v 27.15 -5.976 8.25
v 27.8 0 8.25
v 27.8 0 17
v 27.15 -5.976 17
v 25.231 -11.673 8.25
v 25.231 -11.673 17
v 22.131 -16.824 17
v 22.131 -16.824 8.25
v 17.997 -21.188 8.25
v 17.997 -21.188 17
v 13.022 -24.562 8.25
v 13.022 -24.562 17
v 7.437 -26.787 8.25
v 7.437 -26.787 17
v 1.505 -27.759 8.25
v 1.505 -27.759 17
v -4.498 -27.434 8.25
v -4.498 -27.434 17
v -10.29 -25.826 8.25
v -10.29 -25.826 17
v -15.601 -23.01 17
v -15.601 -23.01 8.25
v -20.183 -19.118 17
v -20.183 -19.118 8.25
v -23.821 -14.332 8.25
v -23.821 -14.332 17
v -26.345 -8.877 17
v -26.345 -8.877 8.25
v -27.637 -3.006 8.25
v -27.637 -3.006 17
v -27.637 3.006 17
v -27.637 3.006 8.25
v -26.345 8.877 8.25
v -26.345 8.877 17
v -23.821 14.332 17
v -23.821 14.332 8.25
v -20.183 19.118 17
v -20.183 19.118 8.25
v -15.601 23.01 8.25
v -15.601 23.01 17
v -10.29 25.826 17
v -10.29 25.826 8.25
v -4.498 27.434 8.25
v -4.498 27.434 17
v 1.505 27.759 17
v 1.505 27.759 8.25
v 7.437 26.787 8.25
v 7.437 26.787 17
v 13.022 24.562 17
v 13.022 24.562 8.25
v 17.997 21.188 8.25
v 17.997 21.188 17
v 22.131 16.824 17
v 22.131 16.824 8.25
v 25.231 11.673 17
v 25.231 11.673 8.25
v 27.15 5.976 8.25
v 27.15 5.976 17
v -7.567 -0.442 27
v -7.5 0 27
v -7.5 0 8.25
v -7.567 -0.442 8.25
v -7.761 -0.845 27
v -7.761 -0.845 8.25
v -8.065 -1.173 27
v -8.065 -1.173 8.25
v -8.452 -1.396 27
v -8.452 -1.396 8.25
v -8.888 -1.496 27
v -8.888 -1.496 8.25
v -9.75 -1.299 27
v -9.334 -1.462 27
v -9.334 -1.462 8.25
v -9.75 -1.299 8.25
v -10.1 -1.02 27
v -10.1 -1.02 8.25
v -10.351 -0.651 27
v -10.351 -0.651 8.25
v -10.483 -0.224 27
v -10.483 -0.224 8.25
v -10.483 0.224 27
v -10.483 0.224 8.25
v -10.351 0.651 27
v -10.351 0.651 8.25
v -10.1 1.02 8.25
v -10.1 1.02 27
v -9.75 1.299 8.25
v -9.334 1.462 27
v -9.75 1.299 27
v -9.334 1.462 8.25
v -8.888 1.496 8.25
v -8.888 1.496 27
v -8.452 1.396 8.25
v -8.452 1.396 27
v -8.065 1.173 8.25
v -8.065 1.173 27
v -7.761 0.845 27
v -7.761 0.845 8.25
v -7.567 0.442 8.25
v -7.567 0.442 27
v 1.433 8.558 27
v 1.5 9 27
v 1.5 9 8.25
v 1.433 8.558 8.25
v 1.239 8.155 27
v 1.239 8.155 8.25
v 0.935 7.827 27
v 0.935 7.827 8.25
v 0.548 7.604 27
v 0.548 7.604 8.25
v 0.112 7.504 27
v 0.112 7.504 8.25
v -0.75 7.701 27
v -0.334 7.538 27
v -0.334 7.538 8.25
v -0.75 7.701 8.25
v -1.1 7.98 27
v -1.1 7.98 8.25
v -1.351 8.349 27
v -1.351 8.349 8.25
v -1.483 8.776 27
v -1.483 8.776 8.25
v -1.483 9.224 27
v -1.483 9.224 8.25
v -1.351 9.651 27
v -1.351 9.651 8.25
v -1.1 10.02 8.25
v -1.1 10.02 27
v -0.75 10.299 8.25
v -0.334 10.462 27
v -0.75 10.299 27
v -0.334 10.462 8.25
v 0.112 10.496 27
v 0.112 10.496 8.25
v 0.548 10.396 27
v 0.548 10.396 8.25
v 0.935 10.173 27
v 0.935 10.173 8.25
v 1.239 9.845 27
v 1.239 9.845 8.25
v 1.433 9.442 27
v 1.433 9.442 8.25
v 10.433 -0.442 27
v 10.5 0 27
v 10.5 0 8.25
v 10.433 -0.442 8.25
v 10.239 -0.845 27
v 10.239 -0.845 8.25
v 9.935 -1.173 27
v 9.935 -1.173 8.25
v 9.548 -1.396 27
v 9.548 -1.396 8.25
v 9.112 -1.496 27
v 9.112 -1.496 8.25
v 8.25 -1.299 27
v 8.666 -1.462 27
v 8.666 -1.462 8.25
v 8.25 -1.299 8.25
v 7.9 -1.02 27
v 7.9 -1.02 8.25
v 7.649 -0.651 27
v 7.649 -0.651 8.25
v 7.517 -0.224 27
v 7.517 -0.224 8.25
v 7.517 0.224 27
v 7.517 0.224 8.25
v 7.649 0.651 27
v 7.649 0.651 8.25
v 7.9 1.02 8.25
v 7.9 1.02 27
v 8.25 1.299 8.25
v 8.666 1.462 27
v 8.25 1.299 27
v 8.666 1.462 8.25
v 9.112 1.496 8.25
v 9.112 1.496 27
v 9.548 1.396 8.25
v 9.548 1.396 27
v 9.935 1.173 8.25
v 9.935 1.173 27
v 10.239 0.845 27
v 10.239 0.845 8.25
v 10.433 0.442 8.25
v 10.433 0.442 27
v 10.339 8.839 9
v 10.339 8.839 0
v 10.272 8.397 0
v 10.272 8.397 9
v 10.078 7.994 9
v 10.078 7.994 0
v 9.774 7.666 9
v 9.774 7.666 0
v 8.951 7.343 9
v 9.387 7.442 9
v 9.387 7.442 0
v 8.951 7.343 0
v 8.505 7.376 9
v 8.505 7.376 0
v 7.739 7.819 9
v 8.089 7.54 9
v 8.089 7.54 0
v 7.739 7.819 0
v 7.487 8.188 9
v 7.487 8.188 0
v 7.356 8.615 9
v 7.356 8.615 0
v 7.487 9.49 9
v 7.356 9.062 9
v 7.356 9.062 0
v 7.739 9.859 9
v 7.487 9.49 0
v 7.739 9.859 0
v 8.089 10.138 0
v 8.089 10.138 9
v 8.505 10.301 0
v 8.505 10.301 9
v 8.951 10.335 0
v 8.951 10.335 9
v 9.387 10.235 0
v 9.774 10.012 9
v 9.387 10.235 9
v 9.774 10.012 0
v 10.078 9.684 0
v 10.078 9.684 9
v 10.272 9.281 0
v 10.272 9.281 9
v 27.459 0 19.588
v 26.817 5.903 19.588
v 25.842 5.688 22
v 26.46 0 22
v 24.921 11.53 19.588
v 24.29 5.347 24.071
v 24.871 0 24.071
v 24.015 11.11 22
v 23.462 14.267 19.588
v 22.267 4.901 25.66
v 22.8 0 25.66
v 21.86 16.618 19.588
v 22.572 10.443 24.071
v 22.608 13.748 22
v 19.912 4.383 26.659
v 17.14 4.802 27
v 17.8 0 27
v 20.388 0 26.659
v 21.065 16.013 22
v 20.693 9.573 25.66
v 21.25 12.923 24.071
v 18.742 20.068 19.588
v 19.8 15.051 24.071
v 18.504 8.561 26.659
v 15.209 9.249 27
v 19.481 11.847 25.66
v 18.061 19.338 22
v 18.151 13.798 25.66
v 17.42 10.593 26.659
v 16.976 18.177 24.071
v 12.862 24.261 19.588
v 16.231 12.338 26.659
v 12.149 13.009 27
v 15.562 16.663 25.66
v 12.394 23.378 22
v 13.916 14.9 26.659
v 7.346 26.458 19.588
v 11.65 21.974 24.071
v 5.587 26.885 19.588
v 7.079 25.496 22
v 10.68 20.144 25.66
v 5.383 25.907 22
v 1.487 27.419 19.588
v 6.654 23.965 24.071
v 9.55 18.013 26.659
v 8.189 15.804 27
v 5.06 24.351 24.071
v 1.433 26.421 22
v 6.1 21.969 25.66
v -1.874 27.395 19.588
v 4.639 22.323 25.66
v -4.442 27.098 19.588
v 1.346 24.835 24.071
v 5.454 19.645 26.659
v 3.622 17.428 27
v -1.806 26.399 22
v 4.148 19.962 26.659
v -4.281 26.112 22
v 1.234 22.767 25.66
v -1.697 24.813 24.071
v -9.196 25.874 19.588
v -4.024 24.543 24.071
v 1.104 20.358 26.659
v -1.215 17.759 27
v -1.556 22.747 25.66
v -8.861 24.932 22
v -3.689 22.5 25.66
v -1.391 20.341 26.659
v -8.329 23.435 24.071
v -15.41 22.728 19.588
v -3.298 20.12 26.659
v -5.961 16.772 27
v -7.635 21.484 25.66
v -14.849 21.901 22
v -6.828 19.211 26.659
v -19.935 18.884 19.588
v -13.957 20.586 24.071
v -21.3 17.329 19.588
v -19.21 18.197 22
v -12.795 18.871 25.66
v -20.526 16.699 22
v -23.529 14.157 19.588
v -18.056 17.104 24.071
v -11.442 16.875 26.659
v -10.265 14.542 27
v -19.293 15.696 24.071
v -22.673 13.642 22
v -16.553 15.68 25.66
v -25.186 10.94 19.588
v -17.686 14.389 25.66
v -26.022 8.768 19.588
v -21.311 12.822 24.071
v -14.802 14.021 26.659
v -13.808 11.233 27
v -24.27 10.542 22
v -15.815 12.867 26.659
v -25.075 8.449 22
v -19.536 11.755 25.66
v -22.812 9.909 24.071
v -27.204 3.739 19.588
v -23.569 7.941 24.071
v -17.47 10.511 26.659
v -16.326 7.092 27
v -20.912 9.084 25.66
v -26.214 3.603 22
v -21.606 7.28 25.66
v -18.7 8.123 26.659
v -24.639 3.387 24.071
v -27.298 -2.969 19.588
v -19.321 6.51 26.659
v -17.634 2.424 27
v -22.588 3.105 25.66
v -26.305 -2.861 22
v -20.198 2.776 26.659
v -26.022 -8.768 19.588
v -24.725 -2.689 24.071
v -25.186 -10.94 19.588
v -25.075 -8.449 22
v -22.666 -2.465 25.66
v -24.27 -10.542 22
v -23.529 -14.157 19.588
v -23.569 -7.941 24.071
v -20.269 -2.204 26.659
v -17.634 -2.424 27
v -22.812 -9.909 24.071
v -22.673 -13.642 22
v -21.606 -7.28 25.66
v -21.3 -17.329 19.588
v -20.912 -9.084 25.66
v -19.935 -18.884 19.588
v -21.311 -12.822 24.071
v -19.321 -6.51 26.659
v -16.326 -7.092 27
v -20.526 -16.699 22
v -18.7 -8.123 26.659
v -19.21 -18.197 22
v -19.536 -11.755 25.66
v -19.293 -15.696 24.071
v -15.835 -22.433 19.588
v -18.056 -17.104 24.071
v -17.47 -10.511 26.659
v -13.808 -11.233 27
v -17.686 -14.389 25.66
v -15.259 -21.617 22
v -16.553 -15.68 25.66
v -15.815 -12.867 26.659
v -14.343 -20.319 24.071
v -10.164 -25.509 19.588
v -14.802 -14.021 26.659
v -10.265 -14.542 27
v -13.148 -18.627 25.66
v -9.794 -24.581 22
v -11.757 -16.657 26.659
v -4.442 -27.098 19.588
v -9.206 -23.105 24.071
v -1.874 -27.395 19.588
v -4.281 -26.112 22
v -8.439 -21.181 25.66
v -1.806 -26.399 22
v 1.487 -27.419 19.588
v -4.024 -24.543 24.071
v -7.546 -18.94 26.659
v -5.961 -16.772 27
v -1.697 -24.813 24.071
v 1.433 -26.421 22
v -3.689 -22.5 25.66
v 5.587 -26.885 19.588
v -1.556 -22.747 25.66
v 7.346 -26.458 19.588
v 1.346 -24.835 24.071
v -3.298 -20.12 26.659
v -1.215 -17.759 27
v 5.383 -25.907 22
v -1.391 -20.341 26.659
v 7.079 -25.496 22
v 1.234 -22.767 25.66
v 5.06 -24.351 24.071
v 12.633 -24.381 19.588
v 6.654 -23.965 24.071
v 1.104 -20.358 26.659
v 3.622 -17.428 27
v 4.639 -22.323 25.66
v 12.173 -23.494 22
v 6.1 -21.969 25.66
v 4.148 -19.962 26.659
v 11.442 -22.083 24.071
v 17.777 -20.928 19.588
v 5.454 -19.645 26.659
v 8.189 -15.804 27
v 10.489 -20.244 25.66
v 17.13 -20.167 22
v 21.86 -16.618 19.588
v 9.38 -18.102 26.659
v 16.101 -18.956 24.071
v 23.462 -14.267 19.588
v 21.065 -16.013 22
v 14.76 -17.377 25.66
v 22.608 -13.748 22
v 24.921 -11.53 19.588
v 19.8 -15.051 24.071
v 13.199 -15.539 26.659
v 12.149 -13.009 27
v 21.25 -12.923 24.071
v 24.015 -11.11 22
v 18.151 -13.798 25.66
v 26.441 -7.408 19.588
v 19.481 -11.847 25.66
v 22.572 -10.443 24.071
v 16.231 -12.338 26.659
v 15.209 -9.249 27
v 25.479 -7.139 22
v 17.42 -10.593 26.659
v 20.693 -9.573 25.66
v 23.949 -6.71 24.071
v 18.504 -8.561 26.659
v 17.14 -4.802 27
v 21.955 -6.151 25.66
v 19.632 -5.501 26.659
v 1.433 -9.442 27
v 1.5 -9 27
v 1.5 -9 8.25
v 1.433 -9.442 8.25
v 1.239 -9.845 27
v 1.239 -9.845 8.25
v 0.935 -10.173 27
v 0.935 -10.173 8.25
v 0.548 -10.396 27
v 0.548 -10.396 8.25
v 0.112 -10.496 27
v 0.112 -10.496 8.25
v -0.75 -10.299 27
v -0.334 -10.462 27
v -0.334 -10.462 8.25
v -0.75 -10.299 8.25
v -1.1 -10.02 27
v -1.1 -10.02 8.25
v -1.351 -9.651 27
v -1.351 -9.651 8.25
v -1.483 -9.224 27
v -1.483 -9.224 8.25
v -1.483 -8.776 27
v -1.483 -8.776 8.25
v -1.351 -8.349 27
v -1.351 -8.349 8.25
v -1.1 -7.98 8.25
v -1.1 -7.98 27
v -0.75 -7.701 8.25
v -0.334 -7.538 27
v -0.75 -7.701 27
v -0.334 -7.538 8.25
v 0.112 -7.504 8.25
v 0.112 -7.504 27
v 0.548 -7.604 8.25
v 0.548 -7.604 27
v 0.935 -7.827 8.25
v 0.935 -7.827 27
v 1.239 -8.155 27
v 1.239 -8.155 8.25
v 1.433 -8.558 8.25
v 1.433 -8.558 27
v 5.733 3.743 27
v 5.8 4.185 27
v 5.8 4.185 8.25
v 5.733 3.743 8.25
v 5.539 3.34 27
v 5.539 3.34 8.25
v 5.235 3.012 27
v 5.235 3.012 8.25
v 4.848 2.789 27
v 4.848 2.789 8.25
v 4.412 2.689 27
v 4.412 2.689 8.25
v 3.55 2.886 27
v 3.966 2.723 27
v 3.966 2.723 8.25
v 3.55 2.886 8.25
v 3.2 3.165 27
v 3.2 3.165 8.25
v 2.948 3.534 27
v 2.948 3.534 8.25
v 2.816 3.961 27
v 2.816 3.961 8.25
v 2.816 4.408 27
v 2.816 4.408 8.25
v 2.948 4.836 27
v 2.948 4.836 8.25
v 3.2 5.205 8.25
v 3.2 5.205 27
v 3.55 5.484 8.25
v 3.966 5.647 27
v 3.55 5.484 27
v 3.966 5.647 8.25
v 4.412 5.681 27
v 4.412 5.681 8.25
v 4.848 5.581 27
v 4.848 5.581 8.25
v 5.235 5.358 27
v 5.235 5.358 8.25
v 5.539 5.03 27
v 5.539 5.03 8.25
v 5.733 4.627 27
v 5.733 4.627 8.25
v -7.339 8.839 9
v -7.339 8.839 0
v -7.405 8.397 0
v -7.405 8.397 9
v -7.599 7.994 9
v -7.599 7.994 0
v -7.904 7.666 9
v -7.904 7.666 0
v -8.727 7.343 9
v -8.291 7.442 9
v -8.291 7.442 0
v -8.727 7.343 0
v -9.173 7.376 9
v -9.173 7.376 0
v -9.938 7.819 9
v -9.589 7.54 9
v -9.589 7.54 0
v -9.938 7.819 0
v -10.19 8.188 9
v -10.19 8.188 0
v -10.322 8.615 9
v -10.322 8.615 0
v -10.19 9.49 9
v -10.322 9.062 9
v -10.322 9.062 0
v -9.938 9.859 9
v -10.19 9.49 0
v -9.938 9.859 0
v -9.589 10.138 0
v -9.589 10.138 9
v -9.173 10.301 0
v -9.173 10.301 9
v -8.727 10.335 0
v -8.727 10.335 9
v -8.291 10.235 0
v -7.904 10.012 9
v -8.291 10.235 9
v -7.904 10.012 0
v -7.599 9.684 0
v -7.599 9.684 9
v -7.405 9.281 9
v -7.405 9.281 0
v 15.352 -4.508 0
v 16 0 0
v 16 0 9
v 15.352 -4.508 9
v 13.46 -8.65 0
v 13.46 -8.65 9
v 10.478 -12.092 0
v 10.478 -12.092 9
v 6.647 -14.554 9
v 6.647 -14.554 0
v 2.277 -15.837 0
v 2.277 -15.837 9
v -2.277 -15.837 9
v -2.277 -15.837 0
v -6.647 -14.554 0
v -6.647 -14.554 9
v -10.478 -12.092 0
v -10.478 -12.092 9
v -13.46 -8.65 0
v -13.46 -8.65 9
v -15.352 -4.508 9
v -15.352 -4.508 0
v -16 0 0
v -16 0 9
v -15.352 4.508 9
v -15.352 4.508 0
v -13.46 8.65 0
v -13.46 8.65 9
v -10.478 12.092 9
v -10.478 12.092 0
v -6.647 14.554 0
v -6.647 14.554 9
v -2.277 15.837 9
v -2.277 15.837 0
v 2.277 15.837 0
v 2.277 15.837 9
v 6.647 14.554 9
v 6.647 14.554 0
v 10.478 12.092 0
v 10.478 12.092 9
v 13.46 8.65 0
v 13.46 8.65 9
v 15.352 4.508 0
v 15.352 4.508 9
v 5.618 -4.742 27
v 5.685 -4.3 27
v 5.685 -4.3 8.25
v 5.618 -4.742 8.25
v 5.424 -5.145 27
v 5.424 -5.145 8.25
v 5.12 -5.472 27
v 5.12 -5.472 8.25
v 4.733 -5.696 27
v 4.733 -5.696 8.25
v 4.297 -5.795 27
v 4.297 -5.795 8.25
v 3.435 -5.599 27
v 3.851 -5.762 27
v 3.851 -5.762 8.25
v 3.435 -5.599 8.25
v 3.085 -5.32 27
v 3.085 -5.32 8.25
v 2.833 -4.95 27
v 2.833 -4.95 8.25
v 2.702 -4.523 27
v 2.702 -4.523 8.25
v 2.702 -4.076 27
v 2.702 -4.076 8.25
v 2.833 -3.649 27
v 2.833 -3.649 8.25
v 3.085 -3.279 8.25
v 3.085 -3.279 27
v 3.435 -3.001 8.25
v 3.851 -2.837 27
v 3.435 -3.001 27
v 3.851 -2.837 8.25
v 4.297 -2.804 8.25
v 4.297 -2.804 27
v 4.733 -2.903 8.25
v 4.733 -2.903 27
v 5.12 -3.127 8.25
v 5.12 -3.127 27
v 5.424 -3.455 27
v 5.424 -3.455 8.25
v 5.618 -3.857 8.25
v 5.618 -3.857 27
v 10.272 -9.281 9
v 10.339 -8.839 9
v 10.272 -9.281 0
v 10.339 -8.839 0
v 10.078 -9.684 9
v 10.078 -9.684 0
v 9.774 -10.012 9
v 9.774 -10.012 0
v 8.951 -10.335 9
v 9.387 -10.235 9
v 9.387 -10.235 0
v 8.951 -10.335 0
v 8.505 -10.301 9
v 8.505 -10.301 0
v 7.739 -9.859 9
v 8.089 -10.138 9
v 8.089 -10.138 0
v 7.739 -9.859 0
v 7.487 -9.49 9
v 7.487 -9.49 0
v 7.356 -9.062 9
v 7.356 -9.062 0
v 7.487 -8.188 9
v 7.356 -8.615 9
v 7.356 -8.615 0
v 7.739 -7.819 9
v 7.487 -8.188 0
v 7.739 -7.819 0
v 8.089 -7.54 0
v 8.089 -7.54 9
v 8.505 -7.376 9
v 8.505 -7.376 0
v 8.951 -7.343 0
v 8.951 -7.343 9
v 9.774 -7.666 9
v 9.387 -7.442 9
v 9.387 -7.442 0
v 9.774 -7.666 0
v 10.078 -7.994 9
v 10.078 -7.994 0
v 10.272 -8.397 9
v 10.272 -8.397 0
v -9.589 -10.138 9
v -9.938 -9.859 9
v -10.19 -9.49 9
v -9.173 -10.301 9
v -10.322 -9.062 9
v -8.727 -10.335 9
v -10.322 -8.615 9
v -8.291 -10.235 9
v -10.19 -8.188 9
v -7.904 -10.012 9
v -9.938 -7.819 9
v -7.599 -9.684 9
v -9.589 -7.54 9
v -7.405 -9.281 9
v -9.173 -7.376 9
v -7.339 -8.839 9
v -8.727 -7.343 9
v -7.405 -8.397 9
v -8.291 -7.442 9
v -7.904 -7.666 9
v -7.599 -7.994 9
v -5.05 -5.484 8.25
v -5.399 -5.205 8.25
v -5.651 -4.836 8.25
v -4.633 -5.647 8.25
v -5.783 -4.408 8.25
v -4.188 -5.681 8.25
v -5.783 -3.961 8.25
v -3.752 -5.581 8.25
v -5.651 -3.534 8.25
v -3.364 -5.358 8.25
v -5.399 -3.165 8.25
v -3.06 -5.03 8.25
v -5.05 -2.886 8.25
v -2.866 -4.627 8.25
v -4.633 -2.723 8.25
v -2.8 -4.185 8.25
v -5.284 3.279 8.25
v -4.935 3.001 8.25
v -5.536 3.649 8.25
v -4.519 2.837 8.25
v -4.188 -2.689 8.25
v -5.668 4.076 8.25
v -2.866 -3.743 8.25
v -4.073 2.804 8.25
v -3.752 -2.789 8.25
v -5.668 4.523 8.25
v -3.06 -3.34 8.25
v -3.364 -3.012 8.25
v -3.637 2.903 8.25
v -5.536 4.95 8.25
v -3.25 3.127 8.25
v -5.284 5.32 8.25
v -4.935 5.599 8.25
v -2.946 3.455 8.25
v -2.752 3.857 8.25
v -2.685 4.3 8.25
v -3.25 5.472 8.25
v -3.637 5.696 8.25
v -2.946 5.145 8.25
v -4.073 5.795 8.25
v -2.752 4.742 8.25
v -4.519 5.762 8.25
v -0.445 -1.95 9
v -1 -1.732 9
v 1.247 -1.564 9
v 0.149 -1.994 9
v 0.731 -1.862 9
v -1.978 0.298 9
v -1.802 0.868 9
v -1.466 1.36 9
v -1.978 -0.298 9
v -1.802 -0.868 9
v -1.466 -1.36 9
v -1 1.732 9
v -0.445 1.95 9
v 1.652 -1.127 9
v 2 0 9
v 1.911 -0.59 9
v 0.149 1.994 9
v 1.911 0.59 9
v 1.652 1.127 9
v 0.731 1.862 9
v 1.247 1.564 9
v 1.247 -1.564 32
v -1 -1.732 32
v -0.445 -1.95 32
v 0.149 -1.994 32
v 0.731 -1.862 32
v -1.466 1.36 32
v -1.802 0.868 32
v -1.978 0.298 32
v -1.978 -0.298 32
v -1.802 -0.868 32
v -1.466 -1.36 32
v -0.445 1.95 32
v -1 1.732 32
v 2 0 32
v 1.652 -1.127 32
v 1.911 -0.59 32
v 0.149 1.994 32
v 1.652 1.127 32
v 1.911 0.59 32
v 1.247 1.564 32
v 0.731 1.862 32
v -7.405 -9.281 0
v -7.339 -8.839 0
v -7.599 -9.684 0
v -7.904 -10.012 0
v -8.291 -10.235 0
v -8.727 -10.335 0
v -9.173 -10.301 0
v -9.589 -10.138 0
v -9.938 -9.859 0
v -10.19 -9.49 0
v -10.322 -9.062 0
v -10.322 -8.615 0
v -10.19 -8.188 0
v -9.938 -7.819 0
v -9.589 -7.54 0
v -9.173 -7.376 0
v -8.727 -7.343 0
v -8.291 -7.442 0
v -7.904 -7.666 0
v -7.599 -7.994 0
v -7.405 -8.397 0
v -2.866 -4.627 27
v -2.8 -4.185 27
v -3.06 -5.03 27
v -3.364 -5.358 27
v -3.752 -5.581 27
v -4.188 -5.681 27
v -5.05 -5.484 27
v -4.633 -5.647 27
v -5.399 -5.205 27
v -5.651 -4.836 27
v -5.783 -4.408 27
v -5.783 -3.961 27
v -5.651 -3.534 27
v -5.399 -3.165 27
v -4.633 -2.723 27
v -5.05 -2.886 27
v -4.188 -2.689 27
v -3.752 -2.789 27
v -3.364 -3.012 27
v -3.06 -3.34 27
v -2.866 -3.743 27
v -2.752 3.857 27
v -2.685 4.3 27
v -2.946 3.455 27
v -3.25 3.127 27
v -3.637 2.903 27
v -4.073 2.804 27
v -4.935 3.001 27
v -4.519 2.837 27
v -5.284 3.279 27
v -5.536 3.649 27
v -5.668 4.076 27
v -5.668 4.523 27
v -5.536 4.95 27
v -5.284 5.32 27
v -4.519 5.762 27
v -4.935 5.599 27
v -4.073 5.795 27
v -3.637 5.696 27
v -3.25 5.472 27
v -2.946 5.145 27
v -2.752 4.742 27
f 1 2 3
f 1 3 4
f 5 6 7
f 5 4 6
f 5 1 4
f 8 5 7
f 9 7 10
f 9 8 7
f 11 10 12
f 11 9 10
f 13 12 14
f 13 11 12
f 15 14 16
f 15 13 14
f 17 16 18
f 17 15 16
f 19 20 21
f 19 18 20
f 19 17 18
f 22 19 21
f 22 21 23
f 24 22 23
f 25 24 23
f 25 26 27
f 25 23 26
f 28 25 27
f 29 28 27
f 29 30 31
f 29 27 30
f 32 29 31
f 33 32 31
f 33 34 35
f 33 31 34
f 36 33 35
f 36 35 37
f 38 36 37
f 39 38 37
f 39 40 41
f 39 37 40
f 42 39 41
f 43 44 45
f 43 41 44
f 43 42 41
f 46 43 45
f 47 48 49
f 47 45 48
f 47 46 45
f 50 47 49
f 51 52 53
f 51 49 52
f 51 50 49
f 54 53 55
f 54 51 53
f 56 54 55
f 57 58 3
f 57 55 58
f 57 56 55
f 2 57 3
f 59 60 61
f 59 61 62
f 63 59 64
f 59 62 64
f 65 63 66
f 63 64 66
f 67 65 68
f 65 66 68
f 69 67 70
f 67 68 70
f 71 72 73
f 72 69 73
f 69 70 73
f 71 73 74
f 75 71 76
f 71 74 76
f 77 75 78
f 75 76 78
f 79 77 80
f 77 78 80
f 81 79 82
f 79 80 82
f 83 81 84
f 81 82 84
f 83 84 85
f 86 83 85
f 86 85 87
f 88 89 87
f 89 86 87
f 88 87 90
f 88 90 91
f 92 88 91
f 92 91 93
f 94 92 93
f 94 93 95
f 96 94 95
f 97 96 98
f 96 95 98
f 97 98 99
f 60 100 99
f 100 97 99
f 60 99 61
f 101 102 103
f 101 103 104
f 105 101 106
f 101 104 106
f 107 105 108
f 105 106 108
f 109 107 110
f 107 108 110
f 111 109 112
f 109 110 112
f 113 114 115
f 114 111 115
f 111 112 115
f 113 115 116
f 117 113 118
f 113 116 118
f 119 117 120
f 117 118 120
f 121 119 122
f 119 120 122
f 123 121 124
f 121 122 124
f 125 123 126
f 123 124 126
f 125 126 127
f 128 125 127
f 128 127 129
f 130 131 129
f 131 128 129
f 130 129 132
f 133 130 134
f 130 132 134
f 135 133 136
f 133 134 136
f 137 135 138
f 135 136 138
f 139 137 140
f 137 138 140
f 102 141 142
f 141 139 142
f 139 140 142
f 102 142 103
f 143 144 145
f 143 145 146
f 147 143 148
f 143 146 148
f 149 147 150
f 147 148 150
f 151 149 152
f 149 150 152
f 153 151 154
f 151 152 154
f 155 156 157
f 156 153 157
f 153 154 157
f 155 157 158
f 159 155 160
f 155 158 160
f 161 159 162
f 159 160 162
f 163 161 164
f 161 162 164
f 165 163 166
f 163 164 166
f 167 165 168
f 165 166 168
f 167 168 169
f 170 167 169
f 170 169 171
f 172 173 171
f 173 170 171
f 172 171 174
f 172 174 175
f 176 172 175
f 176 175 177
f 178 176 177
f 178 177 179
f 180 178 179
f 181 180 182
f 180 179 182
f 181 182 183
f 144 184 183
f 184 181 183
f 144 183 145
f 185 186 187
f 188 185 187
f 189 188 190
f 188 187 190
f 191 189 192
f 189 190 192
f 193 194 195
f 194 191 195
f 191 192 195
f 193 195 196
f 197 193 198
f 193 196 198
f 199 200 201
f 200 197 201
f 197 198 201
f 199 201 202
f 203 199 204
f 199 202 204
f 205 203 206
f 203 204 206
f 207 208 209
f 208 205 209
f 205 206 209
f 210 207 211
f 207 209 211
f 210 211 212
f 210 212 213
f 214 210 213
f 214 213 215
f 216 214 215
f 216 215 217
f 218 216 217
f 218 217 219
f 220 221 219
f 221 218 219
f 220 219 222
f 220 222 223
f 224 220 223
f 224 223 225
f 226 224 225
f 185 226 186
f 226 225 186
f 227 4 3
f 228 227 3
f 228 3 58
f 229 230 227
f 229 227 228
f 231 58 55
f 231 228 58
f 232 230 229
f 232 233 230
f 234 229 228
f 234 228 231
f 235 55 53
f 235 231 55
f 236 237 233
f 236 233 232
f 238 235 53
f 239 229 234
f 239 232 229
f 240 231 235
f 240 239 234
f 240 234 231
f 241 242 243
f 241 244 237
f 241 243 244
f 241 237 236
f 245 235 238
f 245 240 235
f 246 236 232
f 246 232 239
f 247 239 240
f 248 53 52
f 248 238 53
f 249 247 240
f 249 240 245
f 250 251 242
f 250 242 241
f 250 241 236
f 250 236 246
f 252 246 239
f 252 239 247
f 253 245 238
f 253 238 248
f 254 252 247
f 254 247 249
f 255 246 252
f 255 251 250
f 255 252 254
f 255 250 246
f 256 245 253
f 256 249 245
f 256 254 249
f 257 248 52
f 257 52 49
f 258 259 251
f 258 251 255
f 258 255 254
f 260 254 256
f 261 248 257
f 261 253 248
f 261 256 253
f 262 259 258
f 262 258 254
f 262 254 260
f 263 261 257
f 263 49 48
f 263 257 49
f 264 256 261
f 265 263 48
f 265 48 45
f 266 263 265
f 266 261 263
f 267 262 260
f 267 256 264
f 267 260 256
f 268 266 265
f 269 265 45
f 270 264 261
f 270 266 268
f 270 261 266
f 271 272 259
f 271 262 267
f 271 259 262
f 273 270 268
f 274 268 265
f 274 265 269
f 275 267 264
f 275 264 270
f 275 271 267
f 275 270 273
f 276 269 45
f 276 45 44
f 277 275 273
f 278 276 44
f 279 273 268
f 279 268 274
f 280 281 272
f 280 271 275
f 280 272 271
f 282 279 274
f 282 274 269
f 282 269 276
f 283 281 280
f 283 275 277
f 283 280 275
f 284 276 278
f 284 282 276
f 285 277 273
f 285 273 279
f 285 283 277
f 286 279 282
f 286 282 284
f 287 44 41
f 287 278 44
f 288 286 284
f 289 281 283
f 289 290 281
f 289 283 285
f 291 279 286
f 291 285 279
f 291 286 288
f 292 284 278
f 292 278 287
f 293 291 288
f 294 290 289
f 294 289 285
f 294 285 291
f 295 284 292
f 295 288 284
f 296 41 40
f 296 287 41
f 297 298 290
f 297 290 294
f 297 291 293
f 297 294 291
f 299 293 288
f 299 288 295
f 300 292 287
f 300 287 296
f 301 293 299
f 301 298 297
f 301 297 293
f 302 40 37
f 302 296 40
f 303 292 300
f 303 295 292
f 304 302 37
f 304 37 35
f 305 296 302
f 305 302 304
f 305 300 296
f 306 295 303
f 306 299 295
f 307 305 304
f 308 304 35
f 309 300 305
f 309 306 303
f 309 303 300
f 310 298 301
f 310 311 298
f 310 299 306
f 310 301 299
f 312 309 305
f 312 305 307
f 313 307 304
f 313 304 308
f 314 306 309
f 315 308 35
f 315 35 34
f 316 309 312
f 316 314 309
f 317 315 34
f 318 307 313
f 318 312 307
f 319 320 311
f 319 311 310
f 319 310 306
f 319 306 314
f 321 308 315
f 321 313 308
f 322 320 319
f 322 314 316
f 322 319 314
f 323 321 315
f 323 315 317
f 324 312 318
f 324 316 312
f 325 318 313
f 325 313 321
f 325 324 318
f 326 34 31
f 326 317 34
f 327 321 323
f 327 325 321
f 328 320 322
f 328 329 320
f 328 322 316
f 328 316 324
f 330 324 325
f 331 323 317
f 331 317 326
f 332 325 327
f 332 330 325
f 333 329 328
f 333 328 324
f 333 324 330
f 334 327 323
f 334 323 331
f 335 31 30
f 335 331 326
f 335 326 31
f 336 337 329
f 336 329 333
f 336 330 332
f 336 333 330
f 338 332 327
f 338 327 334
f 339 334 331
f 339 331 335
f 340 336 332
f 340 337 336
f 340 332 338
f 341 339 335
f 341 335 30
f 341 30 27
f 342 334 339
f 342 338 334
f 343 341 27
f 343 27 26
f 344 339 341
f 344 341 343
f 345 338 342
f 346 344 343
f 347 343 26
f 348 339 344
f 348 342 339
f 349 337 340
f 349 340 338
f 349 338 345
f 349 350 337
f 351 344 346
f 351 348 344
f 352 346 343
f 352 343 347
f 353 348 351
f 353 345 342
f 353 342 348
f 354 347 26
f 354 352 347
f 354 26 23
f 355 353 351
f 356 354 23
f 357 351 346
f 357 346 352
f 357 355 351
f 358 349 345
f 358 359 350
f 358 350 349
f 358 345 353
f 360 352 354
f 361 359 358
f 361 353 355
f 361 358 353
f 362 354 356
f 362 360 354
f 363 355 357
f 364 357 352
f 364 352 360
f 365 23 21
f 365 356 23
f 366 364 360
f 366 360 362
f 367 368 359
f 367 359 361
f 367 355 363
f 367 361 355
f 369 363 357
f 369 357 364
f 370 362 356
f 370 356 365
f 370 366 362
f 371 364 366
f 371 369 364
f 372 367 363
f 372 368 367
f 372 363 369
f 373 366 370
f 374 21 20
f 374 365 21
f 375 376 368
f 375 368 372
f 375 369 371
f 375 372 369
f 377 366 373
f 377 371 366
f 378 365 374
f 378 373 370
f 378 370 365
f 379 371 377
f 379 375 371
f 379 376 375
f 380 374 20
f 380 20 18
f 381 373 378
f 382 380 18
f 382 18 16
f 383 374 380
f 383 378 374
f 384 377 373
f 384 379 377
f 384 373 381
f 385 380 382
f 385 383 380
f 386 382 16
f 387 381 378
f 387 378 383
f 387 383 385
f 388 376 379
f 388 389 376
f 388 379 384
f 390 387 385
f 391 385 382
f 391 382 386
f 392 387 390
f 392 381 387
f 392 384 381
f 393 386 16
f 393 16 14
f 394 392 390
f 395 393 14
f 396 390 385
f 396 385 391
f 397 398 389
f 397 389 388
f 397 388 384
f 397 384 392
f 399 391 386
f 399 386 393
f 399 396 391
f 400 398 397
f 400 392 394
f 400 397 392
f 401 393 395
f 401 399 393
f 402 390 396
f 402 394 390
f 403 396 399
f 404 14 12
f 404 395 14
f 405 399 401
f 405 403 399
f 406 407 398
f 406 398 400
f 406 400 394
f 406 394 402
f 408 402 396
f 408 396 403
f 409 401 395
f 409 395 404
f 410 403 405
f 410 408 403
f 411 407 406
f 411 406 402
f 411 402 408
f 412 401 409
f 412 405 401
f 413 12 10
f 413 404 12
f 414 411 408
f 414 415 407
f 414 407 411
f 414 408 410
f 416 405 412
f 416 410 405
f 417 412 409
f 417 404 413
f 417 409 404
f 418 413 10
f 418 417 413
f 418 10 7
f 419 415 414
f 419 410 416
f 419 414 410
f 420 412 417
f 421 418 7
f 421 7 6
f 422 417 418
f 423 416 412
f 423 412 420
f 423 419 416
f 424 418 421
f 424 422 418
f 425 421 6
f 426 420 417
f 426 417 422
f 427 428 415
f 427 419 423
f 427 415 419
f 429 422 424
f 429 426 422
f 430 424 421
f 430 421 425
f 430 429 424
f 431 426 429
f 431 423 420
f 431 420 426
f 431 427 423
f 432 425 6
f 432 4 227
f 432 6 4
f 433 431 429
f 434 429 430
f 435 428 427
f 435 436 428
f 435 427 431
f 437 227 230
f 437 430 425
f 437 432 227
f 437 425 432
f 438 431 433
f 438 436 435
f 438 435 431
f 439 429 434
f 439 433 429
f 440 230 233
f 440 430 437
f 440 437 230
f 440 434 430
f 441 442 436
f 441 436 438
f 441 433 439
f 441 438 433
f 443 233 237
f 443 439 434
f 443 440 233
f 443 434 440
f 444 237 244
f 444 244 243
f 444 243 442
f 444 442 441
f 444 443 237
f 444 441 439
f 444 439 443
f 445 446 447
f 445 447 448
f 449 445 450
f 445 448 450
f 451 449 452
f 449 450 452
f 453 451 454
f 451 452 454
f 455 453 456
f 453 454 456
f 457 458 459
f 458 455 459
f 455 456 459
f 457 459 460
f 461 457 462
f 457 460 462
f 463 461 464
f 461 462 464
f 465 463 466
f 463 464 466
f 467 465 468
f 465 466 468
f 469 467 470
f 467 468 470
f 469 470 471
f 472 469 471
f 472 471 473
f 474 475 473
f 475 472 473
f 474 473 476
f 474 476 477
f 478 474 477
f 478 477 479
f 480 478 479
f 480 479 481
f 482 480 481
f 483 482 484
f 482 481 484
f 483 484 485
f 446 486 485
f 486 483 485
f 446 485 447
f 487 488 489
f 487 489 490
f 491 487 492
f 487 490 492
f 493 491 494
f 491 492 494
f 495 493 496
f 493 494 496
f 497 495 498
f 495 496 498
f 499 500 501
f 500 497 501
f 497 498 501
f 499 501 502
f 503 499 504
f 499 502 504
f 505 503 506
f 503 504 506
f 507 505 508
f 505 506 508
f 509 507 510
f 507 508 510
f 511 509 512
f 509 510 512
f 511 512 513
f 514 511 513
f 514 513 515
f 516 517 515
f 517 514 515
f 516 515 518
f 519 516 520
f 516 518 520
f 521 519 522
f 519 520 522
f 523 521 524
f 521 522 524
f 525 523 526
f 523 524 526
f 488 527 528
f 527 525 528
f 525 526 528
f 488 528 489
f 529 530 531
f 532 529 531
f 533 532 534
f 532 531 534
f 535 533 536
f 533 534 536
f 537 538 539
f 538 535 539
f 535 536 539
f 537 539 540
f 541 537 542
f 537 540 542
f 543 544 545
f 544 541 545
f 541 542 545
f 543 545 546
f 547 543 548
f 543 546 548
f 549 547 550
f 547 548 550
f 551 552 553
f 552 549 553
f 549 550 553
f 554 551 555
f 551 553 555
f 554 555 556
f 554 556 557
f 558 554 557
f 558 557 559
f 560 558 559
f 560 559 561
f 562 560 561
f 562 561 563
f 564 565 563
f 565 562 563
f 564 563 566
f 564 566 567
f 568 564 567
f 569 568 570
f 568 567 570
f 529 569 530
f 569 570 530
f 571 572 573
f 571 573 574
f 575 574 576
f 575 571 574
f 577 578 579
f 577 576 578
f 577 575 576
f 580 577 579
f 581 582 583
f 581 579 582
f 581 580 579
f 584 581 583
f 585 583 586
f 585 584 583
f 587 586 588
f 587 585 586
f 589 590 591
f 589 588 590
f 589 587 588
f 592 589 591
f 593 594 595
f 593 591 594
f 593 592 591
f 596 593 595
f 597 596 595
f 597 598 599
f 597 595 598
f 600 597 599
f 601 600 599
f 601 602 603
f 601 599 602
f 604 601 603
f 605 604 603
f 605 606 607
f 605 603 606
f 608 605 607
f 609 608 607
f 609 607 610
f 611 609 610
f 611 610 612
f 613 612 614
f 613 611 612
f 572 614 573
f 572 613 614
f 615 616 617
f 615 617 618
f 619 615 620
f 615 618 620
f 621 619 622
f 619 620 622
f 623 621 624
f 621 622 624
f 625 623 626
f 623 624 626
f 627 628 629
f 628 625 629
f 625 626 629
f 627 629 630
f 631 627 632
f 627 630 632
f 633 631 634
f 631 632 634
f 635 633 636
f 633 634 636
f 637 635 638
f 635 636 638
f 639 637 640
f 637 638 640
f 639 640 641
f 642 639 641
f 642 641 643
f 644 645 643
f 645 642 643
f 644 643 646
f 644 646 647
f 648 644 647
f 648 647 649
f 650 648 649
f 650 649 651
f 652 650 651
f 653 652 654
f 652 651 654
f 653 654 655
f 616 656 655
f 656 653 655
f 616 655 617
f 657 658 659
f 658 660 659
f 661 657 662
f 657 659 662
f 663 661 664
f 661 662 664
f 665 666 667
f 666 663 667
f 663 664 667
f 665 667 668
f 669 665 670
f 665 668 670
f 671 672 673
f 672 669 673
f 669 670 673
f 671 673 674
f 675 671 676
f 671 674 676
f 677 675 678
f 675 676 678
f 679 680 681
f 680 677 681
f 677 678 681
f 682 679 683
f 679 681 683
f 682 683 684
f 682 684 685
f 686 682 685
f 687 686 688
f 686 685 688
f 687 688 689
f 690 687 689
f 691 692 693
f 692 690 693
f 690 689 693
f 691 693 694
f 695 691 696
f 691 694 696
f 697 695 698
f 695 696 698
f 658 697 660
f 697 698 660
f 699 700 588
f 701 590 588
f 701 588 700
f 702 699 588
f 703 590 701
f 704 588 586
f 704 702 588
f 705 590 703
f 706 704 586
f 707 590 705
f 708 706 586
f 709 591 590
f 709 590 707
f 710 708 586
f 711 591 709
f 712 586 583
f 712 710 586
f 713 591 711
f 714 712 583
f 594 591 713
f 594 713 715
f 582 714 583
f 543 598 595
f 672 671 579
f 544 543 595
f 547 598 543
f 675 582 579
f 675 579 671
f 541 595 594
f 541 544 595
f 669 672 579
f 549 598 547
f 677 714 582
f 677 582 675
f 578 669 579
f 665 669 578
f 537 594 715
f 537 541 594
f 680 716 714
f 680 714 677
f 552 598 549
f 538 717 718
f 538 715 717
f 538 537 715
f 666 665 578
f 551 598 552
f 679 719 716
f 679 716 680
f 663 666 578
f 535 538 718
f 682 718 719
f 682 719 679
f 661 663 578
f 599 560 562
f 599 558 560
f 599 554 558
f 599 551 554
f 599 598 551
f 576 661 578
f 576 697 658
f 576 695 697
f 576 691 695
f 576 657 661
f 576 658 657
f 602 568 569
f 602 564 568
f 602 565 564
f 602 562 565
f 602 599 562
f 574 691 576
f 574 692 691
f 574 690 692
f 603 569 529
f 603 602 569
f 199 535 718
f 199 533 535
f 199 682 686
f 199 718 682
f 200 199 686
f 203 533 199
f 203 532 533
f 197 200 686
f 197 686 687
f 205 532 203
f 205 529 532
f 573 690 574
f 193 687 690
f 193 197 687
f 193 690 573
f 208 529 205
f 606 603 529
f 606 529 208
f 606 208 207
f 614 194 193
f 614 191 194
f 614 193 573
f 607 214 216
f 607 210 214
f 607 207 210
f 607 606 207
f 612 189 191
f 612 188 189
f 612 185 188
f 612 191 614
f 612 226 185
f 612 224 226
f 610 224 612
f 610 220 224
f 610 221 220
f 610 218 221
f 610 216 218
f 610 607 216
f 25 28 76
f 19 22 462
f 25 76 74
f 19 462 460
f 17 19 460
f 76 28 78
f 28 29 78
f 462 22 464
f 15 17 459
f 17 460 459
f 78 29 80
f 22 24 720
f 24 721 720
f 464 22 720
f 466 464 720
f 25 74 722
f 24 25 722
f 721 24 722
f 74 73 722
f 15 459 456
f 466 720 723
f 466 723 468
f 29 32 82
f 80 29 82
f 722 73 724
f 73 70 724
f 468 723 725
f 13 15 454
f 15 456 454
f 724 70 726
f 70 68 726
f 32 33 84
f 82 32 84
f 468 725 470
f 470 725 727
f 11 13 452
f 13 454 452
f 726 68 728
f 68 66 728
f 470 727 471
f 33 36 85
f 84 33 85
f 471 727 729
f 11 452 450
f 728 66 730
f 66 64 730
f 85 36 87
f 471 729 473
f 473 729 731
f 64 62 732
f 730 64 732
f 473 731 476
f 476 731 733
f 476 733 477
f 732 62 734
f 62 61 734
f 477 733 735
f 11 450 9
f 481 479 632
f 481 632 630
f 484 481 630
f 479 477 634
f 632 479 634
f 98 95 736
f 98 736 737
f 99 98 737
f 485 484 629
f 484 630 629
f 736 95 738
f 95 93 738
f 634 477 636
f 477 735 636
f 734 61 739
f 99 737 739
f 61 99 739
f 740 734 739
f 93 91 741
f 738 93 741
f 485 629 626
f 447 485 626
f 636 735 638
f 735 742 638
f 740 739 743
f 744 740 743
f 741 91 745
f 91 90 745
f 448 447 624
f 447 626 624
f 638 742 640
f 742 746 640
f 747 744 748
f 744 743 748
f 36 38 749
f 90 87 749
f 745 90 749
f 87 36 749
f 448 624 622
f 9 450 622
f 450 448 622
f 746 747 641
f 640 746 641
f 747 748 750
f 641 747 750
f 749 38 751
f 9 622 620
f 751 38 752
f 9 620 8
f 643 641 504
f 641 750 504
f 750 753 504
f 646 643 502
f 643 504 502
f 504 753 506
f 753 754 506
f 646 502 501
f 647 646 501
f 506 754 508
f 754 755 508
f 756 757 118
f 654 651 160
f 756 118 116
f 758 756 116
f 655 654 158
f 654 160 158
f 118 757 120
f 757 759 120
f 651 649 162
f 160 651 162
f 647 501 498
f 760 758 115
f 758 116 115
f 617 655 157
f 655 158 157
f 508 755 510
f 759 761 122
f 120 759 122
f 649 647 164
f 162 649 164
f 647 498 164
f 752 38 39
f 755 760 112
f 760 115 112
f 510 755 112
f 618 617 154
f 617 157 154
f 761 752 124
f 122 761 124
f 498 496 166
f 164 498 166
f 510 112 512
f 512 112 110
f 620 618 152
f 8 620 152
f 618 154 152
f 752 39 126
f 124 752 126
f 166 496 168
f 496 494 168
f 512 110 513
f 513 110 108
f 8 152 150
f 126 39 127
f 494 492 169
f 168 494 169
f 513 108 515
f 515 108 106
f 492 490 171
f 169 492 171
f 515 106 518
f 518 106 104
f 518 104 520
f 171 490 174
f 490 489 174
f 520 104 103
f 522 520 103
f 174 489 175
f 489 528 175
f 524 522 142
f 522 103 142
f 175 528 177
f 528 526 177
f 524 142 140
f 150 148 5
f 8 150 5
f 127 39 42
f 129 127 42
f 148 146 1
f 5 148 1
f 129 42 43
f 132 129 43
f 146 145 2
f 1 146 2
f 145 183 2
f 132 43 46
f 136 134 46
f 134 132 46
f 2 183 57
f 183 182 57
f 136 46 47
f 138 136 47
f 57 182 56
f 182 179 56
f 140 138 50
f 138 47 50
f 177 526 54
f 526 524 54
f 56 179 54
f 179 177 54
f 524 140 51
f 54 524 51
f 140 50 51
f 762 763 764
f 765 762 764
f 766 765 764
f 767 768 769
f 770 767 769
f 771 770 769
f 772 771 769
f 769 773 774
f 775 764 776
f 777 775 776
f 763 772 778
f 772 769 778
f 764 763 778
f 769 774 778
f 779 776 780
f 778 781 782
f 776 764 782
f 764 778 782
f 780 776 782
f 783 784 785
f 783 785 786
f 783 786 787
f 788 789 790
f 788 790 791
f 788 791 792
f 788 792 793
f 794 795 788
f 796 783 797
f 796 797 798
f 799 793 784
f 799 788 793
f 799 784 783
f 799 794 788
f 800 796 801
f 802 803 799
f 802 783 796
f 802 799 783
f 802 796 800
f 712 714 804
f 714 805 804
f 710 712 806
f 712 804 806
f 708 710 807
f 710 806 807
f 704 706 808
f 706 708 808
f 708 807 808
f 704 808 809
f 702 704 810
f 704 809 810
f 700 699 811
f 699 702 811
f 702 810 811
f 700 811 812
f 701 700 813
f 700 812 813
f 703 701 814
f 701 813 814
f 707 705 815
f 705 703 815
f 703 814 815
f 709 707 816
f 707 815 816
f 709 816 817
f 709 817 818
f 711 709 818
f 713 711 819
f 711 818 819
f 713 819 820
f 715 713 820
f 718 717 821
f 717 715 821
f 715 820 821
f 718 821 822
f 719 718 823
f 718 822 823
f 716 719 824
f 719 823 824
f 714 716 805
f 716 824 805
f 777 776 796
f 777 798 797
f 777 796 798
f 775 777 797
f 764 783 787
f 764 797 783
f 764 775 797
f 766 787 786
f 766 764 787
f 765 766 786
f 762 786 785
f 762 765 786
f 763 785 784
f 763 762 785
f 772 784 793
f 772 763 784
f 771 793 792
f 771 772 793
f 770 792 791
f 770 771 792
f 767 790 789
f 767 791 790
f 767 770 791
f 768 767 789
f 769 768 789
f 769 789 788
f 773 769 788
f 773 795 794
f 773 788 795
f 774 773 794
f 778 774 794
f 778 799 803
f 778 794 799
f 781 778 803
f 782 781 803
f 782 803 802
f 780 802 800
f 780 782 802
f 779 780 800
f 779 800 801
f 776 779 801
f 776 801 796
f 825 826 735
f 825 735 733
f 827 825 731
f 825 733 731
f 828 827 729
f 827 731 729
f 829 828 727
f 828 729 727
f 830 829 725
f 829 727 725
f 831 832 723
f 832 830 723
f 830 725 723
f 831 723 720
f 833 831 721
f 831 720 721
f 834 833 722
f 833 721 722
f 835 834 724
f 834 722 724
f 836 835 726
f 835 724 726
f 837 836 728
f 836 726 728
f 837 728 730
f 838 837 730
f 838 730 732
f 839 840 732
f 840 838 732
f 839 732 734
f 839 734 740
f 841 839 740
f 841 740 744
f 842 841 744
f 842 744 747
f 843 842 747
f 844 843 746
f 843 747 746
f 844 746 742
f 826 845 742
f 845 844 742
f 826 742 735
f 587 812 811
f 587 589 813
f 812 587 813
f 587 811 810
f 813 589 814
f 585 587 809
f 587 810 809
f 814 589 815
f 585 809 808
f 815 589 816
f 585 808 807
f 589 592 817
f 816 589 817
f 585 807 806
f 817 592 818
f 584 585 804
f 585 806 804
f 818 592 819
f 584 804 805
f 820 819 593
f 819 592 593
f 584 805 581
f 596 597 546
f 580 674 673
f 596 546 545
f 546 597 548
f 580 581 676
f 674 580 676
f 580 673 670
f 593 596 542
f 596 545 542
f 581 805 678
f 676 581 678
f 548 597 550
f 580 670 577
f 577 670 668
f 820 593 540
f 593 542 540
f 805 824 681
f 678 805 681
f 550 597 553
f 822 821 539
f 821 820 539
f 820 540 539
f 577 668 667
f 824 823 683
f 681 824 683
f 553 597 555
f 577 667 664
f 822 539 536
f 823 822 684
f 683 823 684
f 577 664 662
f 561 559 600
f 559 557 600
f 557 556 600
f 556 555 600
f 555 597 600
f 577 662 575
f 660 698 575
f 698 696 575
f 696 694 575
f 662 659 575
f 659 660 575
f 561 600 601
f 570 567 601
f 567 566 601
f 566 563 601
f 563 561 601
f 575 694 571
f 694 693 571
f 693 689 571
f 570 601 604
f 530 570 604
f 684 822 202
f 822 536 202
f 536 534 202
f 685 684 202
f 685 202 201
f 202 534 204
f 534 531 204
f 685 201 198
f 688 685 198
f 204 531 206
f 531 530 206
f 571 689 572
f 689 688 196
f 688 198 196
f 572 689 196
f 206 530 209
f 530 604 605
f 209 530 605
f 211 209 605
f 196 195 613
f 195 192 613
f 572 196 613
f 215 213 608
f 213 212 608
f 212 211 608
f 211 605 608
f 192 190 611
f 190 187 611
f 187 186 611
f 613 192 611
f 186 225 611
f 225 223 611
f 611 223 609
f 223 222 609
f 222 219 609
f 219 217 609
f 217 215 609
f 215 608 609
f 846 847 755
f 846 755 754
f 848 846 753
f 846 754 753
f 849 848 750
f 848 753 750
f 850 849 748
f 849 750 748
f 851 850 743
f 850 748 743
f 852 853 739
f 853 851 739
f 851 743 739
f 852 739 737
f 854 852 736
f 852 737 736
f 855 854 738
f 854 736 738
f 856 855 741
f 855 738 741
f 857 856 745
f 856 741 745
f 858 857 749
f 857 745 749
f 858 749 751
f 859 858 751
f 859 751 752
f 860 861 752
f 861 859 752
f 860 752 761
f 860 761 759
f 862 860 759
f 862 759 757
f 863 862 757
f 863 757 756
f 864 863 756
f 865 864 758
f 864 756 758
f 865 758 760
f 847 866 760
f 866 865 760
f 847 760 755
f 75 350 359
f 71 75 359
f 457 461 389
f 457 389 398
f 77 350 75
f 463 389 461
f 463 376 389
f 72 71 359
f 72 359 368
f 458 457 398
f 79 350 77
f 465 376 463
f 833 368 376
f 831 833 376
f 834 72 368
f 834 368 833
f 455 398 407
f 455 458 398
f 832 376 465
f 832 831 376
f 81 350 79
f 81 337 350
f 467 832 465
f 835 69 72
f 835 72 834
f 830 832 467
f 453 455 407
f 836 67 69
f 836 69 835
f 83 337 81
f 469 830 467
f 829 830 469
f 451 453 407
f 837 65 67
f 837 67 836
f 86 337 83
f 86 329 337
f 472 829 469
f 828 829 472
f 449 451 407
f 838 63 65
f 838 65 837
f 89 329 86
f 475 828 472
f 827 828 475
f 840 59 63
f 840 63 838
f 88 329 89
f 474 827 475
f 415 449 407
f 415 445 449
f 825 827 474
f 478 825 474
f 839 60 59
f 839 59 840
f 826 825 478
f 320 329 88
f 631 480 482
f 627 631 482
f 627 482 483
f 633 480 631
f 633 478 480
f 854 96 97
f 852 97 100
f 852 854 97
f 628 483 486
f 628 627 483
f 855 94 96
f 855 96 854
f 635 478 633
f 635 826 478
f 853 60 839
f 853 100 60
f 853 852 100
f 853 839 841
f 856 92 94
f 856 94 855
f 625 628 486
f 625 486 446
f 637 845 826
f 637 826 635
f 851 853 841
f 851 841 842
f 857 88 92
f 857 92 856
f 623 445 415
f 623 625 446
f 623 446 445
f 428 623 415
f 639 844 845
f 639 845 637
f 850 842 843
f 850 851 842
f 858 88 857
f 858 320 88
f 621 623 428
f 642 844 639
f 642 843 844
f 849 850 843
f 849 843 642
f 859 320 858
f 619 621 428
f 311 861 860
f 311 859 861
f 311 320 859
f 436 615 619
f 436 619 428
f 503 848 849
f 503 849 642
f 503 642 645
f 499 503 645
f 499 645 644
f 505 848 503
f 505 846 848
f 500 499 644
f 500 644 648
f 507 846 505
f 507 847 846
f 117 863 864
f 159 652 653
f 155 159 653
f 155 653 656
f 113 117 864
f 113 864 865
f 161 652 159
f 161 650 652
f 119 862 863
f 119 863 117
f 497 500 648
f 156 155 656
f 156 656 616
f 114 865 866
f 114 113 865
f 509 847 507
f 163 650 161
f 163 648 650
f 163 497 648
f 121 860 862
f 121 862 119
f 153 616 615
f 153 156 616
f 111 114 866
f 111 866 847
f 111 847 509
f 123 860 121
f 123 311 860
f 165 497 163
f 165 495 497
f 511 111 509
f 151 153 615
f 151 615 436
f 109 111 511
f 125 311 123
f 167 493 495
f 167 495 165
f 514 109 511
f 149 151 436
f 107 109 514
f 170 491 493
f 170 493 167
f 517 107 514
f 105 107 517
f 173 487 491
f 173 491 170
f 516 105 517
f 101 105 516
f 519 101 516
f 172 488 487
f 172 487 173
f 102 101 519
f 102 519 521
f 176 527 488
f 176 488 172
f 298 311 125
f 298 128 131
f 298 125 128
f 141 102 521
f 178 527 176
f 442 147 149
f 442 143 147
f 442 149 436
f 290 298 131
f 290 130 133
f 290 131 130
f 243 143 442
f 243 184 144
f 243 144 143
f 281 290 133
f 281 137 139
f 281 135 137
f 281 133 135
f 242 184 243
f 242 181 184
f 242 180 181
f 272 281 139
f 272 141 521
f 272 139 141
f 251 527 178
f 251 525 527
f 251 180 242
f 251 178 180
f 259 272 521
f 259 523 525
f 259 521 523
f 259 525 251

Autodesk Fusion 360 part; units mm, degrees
sketch "TopSketch" plane through (0, 0, 0) normal (0, 0, 1) x (1, 0, 0) in component "Stator"
  circle A0 centre (0, 0) radius 12.5 construction
  line L0 (0, 0) -> (28.0713, 28.0713) construction
  line L1 (0, 0) -> (39.6989, 0) construction
  circle A1 centre (8.8388, 8.8388) radius 1.5
  circle A2 centre (-8.8388, 8.8388) radius 1.5
  circle A3 centre (-8.8388, -8.8388) radius 1.5
  circle A4 centre (8.8388, -8.8388) radius 1.5
  circle A5 centre (0, 0) radius 16
  circle A6 centre (0, 0) radius 27.8
  dimension "d1" = 25
  dimension "d2" = 45
  dimension "d3" = 3
  dimension "d5" = 360
  dimension "d7" = 32
  dimension "d15" = 55.6
sketch "FrontSketch" plane through (0, 0, 0) normal (0, 1, 0) x (1, 0, 0) in component "Stator"
  line L0 (-27.8, -27) -> (-27.8, -8.25)
  line L1 (27.8, -27) -> (27.8, -8.25)
  line L2 (0, -23) -> (0, 11) construction
  line L3 (-27.8, -27) -> (27.8, -27)
  line L4 (-27.8, -8.25) -> (27.8, -8.25)
  line L5 (-16, 0) -> (16, 0)
  line L6 (7, -32) -> (-10, -32)
  line L7 (-16, 0) -> (-16, -8.25)
  line L8 (16, 0) -> (16, -8.25)
  dimension "d8" = 27.8
  dimension "d9" = 27.8
  dimension "d10" = 8.25
  dimension "d11" = 27
  dimension "d12" = 32
sketch "TopSketch (2)" plane through (0, 0, 0) normal (0, 0, 1) x (1, 0, 0) in component "Rotor"
  circle A0 centre (0, 0) radius 27.8
  circle A1 centre (0, 0) radius 2
  circle A2 centre (0, 0) radius 9 construction
  circle A3 centre (0, 0) radius 6 construction
  circle A4 centre (0, 9) radius 1.5
  line L0 (0, 0) -> (13, 13) construction
  line L1 (0, 0) -> (18.3848, 0) construction
  circle A5 centre (-4.2996, -4.1849) radius 1.5
  circle A6 centre (-9, 0) radius 1.5
  circle A7 centre (4.1849, -4.2996) radius 1.5
  circle A8 centre (0, -9) radius 1.5
  circle A9 centre (4.2996, 4.1849) radius 1.5
  circle A10 centre (9, 0) radius 1.5
  circle A11 centre (-4.1849, 4.2996) radius 1.5
  dimension "d16" = 4
  dimension "d17" = 18
  dimension "d18" = 12
  dimension "d19" = 3
  dimension "d21" = 45
  dimension "d22" = 18.3848
  dimension "d23" = 3
  dimension "d25" = 360
extrude "Extrude1" add sketch "TopSketch (2)" along normal blind 27 and the other way blind -8.25 contours A0 | A1 makes body 1 in component "Rotor"
extrude "Extrude2" add sketch "TopSketch (2)" along normal blind 32 and the other way blind -9 separate body contours A1 makes body 2 in component "Rotor"
extrude "Extrude2'" add sketch "TopSketch" along normal blind 9 separate body contours A5 makes body 3 in component "Stator"
fillet "Fillet1" radius 10 1 edges at (-25.9187, -10.0529, 27) on bodies 1 in component "Rotor"
extrude "Extrude1'" [suppressed] in component "Stator"
component "Stator" placed x (1, 0, 0) y (0, 1, 0) z (0, 0, 1) at (0, 0, 0)
component "Rotor" placed x (1, 0, 0) y (0, 1, 0) z (0, 0, 1) at (0, 0, 0)
equation "d8 = ( 55.6 / 2 ) * 1 mm"
